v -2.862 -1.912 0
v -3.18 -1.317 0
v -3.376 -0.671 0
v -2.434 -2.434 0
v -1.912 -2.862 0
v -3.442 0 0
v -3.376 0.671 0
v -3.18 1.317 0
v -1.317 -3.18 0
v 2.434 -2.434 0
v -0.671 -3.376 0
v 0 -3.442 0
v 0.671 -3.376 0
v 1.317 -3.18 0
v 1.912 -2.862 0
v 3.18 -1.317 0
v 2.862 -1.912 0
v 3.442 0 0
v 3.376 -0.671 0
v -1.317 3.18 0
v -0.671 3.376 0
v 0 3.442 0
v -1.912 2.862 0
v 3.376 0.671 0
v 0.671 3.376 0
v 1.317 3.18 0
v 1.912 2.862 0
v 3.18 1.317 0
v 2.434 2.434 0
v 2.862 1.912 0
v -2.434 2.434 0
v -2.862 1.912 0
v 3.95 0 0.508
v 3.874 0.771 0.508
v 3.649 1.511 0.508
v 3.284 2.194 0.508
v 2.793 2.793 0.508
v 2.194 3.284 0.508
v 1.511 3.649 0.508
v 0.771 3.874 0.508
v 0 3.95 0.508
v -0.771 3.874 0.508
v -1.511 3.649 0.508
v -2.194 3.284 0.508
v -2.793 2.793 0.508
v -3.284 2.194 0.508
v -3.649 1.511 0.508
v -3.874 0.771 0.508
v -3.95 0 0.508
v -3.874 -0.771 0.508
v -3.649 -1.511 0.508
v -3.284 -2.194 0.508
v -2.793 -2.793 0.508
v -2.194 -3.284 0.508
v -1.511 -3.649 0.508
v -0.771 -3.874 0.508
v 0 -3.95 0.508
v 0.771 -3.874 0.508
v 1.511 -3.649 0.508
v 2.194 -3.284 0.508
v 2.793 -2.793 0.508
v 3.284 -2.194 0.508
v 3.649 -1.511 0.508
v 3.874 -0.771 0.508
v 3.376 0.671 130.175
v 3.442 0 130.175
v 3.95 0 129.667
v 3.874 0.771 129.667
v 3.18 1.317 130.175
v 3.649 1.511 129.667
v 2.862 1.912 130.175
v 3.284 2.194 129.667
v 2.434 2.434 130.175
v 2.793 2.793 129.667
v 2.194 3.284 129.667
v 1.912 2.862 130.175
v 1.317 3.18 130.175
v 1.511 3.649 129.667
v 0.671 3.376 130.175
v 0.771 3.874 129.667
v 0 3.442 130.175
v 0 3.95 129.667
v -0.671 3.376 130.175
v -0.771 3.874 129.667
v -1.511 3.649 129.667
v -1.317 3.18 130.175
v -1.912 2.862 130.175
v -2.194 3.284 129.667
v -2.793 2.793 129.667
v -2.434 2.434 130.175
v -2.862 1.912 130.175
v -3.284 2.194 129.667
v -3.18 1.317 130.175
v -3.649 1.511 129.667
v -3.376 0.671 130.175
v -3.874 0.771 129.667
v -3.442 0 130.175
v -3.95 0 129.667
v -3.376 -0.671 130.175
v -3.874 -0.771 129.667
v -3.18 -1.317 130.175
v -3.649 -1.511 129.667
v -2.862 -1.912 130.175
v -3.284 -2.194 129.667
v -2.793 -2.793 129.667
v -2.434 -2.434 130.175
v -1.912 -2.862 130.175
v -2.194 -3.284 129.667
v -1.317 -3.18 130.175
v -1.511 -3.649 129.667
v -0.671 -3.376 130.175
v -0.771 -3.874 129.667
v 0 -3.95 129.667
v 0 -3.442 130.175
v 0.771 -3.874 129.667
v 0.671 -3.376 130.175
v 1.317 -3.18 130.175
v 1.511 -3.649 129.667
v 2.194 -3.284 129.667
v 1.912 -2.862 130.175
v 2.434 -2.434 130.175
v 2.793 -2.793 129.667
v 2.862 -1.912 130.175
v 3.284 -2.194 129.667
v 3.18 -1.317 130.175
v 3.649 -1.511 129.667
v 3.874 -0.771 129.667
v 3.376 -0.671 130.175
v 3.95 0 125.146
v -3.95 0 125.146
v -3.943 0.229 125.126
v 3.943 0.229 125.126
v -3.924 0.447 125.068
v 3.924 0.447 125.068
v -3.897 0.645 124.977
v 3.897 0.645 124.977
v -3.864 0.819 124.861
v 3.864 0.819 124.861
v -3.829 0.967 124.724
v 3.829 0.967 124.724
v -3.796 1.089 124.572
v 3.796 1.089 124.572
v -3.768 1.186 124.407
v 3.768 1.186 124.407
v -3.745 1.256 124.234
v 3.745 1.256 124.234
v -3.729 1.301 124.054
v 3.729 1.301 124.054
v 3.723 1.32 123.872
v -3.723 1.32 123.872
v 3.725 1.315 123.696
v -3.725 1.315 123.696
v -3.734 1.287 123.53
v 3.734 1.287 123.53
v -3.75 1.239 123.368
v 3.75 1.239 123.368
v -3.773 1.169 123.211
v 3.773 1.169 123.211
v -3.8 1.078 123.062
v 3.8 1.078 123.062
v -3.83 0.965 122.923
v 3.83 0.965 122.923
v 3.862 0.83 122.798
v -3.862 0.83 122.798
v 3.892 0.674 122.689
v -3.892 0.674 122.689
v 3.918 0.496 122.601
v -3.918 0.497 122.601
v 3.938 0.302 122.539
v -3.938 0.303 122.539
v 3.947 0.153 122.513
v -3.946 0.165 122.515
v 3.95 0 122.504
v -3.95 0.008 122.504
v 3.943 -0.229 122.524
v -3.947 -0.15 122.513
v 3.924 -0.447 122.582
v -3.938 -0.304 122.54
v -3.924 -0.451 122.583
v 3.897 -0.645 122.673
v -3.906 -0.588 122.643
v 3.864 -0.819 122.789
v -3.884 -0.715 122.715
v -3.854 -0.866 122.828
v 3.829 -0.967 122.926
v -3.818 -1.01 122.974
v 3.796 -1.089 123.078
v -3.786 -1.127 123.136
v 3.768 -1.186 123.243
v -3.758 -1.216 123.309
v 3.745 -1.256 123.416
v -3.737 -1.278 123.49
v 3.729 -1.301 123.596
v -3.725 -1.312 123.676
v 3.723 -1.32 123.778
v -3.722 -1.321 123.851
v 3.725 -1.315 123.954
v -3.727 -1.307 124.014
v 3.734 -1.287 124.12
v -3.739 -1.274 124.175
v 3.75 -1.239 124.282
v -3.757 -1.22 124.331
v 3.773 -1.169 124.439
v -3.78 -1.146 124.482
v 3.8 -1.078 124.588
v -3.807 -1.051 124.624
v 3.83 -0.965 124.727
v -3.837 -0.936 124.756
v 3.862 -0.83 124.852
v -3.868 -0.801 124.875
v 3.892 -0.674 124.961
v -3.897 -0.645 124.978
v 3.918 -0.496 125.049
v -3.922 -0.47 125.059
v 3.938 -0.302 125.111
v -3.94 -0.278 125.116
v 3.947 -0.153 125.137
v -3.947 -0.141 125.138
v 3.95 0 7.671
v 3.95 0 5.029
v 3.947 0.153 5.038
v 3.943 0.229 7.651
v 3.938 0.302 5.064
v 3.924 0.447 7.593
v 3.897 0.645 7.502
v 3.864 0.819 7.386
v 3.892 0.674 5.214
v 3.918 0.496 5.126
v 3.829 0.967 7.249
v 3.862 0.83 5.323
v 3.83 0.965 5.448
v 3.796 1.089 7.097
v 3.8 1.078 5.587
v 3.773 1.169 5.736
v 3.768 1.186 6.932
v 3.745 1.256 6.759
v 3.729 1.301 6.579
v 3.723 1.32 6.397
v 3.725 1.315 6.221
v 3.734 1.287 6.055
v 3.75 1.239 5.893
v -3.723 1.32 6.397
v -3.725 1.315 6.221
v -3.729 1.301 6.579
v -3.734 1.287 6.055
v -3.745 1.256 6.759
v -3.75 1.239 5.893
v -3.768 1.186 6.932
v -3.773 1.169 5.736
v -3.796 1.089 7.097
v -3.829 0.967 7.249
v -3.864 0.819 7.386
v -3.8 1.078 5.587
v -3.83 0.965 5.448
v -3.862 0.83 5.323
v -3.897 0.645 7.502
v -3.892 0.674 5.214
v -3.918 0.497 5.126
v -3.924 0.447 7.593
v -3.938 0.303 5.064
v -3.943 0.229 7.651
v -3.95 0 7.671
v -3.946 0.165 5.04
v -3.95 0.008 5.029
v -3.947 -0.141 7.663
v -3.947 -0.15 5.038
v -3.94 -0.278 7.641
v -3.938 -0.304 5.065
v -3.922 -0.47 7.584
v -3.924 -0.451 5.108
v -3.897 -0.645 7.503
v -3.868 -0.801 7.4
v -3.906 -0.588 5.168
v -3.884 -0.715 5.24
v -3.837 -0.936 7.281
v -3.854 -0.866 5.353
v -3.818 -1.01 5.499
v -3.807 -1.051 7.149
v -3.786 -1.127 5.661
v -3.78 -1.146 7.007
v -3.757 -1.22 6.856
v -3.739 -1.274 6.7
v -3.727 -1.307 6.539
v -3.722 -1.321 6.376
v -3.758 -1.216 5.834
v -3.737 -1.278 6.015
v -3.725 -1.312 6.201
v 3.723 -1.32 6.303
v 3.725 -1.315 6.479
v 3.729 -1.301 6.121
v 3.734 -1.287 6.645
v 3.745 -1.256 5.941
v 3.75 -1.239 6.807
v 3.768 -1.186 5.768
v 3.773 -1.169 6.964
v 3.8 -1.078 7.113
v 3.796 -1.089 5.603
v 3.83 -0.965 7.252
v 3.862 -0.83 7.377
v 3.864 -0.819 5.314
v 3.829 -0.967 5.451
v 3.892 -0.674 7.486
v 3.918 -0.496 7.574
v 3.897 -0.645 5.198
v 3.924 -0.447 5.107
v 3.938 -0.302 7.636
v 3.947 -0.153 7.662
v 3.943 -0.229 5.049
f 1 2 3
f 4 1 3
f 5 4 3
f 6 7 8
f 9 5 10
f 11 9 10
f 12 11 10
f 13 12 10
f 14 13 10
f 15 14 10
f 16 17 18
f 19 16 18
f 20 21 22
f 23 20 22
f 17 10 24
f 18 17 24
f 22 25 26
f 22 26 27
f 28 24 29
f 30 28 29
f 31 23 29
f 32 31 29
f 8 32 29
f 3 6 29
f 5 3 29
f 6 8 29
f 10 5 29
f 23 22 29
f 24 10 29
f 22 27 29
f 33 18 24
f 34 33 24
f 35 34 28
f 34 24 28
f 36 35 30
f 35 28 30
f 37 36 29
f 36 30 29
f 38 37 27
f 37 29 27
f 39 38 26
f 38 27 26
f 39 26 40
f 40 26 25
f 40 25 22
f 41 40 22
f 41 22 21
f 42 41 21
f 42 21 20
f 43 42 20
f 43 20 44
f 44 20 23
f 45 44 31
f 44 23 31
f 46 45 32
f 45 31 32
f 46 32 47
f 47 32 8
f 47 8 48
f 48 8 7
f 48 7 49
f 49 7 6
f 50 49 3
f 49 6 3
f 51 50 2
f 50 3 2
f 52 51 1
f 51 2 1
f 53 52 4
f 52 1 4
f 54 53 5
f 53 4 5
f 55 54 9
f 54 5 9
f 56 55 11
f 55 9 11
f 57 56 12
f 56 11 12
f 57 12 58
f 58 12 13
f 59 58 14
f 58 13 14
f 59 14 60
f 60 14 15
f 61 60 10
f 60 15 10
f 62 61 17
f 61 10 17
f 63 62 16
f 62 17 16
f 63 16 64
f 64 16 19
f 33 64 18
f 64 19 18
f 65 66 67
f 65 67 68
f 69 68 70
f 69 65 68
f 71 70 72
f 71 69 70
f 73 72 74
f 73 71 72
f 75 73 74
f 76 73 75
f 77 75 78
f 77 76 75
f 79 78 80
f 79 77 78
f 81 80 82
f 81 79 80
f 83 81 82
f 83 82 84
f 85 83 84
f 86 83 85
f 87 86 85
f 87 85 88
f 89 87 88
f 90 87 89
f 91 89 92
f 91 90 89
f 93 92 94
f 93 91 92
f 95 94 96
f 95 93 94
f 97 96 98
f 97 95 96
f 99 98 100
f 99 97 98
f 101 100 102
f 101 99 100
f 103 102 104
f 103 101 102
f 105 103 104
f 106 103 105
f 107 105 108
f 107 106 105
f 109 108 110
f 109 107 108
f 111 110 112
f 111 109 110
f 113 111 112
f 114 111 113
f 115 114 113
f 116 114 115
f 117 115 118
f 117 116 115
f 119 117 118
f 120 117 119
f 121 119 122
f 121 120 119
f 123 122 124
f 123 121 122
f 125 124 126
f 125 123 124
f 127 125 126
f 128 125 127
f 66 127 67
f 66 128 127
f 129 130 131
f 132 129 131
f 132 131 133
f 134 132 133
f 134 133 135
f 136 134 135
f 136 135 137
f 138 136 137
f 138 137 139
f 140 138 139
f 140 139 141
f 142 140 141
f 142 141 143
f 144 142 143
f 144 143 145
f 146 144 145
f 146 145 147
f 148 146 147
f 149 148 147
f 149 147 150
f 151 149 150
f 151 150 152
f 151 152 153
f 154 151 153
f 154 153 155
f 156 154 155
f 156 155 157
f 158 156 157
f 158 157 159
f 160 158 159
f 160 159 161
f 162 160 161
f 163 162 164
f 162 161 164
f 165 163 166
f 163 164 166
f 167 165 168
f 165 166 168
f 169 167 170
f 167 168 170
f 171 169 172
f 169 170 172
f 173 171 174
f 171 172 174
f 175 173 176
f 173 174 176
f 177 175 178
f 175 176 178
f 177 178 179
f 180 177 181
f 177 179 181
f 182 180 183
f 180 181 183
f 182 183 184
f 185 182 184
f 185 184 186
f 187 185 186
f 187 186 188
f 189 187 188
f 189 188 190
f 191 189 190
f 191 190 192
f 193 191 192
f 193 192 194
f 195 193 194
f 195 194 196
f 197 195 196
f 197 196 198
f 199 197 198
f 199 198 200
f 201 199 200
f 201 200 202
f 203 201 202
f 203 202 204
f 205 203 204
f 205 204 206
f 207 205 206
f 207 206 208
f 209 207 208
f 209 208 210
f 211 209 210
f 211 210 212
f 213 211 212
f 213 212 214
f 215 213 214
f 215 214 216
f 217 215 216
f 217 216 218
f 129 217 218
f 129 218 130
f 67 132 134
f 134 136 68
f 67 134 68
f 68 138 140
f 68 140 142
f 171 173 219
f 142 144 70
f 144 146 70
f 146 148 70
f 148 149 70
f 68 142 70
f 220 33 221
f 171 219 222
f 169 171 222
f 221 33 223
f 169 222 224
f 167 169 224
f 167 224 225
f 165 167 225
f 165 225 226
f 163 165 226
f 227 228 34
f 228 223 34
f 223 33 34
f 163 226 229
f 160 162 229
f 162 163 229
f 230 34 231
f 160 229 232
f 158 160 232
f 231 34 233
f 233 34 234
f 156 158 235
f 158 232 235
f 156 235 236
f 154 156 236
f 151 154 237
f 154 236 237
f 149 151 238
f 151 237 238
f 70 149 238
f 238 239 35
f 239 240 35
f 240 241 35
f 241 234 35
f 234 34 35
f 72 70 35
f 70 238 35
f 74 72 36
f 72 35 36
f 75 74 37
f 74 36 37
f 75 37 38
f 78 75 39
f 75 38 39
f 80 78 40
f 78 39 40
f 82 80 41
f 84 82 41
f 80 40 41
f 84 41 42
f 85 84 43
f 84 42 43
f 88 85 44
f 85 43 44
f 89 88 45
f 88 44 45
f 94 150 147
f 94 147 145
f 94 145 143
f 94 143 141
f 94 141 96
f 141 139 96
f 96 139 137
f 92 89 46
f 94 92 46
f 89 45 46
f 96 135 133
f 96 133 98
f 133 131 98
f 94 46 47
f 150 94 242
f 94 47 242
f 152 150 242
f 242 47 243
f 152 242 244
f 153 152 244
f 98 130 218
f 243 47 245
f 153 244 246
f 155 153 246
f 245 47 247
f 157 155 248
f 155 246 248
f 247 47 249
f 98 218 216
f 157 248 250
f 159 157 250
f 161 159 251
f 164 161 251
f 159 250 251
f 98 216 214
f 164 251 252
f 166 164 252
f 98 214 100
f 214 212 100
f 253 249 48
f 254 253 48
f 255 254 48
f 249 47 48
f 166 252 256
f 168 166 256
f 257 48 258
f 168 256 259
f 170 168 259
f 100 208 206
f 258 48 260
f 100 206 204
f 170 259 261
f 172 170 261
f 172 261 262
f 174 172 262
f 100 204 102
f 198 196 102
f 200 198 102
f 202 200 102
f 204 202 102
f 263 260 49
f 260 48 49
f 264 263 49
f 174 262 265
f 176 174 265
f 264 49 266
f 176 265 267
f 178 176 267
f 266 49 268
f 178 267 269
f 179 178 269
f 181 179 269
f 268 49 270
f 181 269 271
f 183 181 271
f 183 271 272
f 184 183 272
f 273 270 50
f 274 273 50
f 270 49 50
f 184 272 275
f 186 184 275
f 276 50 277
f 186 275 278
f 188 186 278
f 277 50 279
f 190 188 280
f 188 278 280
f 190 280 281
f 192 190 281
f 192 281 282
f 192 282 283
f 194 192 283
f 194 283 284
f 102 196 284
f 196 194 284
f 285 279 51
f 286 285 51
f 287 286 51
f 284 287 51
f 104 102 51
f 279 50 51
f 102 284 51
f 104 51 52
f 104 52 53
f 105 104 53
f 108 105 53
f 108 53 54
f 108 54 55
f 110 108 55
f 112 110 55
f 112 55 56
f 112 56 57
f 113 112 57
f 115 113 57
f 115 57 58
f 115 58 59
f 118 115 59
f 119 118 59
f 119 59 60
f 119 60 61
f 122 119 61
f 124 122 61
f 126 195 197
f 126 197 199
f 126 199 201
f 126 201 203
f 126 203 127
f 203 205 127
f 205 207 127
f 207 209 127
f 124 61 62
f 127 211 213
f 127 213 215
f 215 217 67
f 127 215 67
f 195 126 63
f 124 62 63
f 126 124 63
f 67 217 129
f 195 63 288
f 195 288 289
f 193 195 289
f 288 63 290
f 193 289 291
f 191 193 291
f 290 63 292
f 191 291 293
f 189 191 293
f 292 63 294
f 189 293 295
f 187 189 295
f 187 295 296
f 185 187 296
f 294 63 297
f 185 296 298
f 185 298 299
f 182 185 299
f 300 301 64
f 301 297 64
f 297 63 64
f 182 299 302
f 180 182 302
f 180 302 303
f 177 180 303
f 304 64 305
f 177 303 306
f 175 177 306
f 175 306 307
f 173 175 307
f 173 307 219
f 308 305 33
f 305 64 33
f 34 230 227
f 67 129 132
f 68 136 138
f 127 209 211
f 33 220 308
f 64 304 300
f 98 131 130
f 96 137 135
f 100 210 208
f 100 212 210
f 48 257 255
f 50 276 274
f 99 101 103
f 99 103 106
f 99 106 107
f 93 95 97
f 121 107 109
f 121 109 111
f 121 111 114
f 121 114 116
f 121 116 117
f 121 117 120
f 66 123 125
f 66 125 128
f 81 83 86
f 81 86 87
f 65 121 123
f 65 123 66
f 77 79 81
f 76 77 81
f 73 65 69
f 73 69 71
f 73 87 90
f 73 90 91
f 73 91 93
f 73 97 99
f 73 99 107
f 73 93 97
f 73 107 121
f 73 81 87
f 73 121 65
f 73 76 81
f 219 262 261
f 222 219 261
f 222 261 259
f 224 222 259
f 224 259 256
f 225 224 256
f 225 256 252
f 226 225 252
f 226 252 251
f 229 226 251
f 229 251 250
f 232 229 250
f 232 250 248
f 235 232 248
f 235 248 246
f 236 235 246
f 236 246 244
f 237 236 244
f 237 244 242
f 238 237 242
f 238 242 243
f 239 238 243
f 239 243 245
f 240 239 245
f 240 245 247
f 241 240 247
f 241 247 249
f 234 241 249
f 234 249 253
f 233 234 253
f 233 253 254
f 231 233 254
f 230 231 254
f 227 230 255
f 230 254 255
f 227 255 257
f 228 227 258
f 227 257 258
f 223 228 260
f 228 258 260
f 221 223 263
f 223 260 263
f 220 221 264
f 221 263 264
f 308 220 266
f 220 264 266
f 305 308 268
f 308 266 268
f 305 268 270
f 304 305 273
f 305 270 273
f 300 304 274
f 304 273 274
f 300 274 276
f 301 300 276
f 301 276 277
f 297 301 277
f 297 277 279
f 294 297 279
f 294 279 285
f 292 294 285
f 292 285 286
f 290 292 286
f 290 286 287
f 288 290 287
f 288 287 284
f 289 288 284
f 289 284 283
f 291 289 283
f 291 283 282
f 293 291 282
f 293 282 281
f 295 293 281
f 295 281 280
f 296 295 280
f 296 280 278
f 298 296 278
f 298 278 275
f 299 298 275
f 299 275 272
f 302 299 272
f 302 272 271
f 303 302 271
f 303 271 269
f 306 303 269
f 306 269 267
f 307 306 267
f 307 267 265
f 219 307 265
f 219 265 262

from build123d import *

# Parameters (mm, degrees)
SKETCH1_R                   = 3.9497
BOSS_EXTRUDE1_DEPTH         = 130.175
F_37_0_104_DIAMETER_HOLE1_D = 2.6416
CHAMFER1_SIZE               = 0.508


with BuildPart() as part:
    # Sketch1 → Boss-Extrude1 (new body)
    with BuildSketch(Plane.XY):
        Circle(SKETCH1_R)
    extrude(amount=BOSS_EXTRUDE1_DEPTH)

    # #37 (0.104) Diameter Hole1 (through all)
    with Locations(Plane(origin=(3.9497, 0, 0), x_dir=(0, 0, -1), z_dir=(1, 0, 0))):
        with Locations((-6.35, 0), (-123.825, 0)):
            Hole(F_37_0_104_DIAMETER_HOLE1_D / 2)

    # Chamfer1
    chamfer1_edges = [part.edges().sort_by_distance(p)[0] for p in [
        (-3.9497, 0, 0),
        (-3.9497, 0, 130.175),
    ]]
    chamfer(chamfer1_edges, length=CHAMFER1_SIZE)


solid = part.part
